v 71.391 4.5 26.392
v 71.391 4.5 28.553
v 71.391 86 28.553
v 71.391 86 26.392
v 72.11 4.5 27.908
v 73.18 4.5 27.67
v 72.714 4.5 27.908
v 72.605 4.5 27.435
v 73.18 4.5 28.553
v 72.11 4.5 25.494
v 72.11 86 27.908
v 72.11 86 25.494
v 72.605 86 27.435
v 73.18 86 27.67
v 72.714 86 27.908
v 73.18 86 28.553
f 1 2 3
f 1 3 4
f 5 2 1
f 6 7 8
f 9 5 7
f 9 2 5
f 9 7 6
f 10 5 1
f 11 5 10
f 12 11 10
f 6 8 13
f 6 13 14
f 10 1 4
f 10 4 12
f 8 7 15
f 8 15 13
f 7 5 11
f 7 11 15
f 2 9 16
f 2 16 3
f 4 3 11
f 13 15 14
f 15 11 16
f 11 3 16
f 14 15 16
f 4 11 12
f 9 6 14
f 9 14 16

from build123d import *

# Parameters (mm, degrees)
EXTRUDE104_DEPTH                  = 81.5
PART_MIRRORING002_PLACEMENT_ANGLE = 90


with BuildPart() as bottom_notch003:
    # Sketch106 → Extrude104 (new body)
    with BuildSketch(Plane.YZ):
        Polygon((1.890375, 25.594459), (1.890375, 27.613628), (1.890375, 28.007893), (1.285825, 28.007893), (1.394986, 27.535334), (0.819798, 27.769814), (0.819798, 28.652969), (2.608973, 28.652969), (2.608973, 26.491592), align=None)
    extrude(amount=EXTRUDE104_DEPTH)


with BuildPart() as bottom_notch003_1:
    # Extrude104 placement: moved
    add(bottom_notch003.part.moved(Location((4.5, 0, -0.1))))


with BuildPart() as right_notch:
    # Part__Mirroring002: instance of Bottom_Notch003
    add(bottom_notch003_1.part.mirror(Plane(origin=(37, 2e-06, 27.023727), x_dir=(1, 0, 0), z_dir=(0, 1, 0))))


with BuildPart() as right_notch_1:
    # Part__Mirroring002 placement: moved
    add(right_notch.part.rotate(Axis((0, 0, 0), (0, 0, 1)), PART_MIRRORING002_PLACEMENT_ANGLE))


with BuildPart() as part_mirroring003:
    # Part__Mirroring003: instance of right_notch
    add(right_notch_1.part.mirror(Plane(origin=(0, 0, 0), x_dir=(0, -1, 0), z_dir=(1, 0, 0))))


with BuildPart() as part_mirroring003_1:
    # Part__Mirroring003 placement: moved
    add(part_mirroring003.part.moved(Location((74, 0, 0))))


solid = part_mirroring003_1.part
